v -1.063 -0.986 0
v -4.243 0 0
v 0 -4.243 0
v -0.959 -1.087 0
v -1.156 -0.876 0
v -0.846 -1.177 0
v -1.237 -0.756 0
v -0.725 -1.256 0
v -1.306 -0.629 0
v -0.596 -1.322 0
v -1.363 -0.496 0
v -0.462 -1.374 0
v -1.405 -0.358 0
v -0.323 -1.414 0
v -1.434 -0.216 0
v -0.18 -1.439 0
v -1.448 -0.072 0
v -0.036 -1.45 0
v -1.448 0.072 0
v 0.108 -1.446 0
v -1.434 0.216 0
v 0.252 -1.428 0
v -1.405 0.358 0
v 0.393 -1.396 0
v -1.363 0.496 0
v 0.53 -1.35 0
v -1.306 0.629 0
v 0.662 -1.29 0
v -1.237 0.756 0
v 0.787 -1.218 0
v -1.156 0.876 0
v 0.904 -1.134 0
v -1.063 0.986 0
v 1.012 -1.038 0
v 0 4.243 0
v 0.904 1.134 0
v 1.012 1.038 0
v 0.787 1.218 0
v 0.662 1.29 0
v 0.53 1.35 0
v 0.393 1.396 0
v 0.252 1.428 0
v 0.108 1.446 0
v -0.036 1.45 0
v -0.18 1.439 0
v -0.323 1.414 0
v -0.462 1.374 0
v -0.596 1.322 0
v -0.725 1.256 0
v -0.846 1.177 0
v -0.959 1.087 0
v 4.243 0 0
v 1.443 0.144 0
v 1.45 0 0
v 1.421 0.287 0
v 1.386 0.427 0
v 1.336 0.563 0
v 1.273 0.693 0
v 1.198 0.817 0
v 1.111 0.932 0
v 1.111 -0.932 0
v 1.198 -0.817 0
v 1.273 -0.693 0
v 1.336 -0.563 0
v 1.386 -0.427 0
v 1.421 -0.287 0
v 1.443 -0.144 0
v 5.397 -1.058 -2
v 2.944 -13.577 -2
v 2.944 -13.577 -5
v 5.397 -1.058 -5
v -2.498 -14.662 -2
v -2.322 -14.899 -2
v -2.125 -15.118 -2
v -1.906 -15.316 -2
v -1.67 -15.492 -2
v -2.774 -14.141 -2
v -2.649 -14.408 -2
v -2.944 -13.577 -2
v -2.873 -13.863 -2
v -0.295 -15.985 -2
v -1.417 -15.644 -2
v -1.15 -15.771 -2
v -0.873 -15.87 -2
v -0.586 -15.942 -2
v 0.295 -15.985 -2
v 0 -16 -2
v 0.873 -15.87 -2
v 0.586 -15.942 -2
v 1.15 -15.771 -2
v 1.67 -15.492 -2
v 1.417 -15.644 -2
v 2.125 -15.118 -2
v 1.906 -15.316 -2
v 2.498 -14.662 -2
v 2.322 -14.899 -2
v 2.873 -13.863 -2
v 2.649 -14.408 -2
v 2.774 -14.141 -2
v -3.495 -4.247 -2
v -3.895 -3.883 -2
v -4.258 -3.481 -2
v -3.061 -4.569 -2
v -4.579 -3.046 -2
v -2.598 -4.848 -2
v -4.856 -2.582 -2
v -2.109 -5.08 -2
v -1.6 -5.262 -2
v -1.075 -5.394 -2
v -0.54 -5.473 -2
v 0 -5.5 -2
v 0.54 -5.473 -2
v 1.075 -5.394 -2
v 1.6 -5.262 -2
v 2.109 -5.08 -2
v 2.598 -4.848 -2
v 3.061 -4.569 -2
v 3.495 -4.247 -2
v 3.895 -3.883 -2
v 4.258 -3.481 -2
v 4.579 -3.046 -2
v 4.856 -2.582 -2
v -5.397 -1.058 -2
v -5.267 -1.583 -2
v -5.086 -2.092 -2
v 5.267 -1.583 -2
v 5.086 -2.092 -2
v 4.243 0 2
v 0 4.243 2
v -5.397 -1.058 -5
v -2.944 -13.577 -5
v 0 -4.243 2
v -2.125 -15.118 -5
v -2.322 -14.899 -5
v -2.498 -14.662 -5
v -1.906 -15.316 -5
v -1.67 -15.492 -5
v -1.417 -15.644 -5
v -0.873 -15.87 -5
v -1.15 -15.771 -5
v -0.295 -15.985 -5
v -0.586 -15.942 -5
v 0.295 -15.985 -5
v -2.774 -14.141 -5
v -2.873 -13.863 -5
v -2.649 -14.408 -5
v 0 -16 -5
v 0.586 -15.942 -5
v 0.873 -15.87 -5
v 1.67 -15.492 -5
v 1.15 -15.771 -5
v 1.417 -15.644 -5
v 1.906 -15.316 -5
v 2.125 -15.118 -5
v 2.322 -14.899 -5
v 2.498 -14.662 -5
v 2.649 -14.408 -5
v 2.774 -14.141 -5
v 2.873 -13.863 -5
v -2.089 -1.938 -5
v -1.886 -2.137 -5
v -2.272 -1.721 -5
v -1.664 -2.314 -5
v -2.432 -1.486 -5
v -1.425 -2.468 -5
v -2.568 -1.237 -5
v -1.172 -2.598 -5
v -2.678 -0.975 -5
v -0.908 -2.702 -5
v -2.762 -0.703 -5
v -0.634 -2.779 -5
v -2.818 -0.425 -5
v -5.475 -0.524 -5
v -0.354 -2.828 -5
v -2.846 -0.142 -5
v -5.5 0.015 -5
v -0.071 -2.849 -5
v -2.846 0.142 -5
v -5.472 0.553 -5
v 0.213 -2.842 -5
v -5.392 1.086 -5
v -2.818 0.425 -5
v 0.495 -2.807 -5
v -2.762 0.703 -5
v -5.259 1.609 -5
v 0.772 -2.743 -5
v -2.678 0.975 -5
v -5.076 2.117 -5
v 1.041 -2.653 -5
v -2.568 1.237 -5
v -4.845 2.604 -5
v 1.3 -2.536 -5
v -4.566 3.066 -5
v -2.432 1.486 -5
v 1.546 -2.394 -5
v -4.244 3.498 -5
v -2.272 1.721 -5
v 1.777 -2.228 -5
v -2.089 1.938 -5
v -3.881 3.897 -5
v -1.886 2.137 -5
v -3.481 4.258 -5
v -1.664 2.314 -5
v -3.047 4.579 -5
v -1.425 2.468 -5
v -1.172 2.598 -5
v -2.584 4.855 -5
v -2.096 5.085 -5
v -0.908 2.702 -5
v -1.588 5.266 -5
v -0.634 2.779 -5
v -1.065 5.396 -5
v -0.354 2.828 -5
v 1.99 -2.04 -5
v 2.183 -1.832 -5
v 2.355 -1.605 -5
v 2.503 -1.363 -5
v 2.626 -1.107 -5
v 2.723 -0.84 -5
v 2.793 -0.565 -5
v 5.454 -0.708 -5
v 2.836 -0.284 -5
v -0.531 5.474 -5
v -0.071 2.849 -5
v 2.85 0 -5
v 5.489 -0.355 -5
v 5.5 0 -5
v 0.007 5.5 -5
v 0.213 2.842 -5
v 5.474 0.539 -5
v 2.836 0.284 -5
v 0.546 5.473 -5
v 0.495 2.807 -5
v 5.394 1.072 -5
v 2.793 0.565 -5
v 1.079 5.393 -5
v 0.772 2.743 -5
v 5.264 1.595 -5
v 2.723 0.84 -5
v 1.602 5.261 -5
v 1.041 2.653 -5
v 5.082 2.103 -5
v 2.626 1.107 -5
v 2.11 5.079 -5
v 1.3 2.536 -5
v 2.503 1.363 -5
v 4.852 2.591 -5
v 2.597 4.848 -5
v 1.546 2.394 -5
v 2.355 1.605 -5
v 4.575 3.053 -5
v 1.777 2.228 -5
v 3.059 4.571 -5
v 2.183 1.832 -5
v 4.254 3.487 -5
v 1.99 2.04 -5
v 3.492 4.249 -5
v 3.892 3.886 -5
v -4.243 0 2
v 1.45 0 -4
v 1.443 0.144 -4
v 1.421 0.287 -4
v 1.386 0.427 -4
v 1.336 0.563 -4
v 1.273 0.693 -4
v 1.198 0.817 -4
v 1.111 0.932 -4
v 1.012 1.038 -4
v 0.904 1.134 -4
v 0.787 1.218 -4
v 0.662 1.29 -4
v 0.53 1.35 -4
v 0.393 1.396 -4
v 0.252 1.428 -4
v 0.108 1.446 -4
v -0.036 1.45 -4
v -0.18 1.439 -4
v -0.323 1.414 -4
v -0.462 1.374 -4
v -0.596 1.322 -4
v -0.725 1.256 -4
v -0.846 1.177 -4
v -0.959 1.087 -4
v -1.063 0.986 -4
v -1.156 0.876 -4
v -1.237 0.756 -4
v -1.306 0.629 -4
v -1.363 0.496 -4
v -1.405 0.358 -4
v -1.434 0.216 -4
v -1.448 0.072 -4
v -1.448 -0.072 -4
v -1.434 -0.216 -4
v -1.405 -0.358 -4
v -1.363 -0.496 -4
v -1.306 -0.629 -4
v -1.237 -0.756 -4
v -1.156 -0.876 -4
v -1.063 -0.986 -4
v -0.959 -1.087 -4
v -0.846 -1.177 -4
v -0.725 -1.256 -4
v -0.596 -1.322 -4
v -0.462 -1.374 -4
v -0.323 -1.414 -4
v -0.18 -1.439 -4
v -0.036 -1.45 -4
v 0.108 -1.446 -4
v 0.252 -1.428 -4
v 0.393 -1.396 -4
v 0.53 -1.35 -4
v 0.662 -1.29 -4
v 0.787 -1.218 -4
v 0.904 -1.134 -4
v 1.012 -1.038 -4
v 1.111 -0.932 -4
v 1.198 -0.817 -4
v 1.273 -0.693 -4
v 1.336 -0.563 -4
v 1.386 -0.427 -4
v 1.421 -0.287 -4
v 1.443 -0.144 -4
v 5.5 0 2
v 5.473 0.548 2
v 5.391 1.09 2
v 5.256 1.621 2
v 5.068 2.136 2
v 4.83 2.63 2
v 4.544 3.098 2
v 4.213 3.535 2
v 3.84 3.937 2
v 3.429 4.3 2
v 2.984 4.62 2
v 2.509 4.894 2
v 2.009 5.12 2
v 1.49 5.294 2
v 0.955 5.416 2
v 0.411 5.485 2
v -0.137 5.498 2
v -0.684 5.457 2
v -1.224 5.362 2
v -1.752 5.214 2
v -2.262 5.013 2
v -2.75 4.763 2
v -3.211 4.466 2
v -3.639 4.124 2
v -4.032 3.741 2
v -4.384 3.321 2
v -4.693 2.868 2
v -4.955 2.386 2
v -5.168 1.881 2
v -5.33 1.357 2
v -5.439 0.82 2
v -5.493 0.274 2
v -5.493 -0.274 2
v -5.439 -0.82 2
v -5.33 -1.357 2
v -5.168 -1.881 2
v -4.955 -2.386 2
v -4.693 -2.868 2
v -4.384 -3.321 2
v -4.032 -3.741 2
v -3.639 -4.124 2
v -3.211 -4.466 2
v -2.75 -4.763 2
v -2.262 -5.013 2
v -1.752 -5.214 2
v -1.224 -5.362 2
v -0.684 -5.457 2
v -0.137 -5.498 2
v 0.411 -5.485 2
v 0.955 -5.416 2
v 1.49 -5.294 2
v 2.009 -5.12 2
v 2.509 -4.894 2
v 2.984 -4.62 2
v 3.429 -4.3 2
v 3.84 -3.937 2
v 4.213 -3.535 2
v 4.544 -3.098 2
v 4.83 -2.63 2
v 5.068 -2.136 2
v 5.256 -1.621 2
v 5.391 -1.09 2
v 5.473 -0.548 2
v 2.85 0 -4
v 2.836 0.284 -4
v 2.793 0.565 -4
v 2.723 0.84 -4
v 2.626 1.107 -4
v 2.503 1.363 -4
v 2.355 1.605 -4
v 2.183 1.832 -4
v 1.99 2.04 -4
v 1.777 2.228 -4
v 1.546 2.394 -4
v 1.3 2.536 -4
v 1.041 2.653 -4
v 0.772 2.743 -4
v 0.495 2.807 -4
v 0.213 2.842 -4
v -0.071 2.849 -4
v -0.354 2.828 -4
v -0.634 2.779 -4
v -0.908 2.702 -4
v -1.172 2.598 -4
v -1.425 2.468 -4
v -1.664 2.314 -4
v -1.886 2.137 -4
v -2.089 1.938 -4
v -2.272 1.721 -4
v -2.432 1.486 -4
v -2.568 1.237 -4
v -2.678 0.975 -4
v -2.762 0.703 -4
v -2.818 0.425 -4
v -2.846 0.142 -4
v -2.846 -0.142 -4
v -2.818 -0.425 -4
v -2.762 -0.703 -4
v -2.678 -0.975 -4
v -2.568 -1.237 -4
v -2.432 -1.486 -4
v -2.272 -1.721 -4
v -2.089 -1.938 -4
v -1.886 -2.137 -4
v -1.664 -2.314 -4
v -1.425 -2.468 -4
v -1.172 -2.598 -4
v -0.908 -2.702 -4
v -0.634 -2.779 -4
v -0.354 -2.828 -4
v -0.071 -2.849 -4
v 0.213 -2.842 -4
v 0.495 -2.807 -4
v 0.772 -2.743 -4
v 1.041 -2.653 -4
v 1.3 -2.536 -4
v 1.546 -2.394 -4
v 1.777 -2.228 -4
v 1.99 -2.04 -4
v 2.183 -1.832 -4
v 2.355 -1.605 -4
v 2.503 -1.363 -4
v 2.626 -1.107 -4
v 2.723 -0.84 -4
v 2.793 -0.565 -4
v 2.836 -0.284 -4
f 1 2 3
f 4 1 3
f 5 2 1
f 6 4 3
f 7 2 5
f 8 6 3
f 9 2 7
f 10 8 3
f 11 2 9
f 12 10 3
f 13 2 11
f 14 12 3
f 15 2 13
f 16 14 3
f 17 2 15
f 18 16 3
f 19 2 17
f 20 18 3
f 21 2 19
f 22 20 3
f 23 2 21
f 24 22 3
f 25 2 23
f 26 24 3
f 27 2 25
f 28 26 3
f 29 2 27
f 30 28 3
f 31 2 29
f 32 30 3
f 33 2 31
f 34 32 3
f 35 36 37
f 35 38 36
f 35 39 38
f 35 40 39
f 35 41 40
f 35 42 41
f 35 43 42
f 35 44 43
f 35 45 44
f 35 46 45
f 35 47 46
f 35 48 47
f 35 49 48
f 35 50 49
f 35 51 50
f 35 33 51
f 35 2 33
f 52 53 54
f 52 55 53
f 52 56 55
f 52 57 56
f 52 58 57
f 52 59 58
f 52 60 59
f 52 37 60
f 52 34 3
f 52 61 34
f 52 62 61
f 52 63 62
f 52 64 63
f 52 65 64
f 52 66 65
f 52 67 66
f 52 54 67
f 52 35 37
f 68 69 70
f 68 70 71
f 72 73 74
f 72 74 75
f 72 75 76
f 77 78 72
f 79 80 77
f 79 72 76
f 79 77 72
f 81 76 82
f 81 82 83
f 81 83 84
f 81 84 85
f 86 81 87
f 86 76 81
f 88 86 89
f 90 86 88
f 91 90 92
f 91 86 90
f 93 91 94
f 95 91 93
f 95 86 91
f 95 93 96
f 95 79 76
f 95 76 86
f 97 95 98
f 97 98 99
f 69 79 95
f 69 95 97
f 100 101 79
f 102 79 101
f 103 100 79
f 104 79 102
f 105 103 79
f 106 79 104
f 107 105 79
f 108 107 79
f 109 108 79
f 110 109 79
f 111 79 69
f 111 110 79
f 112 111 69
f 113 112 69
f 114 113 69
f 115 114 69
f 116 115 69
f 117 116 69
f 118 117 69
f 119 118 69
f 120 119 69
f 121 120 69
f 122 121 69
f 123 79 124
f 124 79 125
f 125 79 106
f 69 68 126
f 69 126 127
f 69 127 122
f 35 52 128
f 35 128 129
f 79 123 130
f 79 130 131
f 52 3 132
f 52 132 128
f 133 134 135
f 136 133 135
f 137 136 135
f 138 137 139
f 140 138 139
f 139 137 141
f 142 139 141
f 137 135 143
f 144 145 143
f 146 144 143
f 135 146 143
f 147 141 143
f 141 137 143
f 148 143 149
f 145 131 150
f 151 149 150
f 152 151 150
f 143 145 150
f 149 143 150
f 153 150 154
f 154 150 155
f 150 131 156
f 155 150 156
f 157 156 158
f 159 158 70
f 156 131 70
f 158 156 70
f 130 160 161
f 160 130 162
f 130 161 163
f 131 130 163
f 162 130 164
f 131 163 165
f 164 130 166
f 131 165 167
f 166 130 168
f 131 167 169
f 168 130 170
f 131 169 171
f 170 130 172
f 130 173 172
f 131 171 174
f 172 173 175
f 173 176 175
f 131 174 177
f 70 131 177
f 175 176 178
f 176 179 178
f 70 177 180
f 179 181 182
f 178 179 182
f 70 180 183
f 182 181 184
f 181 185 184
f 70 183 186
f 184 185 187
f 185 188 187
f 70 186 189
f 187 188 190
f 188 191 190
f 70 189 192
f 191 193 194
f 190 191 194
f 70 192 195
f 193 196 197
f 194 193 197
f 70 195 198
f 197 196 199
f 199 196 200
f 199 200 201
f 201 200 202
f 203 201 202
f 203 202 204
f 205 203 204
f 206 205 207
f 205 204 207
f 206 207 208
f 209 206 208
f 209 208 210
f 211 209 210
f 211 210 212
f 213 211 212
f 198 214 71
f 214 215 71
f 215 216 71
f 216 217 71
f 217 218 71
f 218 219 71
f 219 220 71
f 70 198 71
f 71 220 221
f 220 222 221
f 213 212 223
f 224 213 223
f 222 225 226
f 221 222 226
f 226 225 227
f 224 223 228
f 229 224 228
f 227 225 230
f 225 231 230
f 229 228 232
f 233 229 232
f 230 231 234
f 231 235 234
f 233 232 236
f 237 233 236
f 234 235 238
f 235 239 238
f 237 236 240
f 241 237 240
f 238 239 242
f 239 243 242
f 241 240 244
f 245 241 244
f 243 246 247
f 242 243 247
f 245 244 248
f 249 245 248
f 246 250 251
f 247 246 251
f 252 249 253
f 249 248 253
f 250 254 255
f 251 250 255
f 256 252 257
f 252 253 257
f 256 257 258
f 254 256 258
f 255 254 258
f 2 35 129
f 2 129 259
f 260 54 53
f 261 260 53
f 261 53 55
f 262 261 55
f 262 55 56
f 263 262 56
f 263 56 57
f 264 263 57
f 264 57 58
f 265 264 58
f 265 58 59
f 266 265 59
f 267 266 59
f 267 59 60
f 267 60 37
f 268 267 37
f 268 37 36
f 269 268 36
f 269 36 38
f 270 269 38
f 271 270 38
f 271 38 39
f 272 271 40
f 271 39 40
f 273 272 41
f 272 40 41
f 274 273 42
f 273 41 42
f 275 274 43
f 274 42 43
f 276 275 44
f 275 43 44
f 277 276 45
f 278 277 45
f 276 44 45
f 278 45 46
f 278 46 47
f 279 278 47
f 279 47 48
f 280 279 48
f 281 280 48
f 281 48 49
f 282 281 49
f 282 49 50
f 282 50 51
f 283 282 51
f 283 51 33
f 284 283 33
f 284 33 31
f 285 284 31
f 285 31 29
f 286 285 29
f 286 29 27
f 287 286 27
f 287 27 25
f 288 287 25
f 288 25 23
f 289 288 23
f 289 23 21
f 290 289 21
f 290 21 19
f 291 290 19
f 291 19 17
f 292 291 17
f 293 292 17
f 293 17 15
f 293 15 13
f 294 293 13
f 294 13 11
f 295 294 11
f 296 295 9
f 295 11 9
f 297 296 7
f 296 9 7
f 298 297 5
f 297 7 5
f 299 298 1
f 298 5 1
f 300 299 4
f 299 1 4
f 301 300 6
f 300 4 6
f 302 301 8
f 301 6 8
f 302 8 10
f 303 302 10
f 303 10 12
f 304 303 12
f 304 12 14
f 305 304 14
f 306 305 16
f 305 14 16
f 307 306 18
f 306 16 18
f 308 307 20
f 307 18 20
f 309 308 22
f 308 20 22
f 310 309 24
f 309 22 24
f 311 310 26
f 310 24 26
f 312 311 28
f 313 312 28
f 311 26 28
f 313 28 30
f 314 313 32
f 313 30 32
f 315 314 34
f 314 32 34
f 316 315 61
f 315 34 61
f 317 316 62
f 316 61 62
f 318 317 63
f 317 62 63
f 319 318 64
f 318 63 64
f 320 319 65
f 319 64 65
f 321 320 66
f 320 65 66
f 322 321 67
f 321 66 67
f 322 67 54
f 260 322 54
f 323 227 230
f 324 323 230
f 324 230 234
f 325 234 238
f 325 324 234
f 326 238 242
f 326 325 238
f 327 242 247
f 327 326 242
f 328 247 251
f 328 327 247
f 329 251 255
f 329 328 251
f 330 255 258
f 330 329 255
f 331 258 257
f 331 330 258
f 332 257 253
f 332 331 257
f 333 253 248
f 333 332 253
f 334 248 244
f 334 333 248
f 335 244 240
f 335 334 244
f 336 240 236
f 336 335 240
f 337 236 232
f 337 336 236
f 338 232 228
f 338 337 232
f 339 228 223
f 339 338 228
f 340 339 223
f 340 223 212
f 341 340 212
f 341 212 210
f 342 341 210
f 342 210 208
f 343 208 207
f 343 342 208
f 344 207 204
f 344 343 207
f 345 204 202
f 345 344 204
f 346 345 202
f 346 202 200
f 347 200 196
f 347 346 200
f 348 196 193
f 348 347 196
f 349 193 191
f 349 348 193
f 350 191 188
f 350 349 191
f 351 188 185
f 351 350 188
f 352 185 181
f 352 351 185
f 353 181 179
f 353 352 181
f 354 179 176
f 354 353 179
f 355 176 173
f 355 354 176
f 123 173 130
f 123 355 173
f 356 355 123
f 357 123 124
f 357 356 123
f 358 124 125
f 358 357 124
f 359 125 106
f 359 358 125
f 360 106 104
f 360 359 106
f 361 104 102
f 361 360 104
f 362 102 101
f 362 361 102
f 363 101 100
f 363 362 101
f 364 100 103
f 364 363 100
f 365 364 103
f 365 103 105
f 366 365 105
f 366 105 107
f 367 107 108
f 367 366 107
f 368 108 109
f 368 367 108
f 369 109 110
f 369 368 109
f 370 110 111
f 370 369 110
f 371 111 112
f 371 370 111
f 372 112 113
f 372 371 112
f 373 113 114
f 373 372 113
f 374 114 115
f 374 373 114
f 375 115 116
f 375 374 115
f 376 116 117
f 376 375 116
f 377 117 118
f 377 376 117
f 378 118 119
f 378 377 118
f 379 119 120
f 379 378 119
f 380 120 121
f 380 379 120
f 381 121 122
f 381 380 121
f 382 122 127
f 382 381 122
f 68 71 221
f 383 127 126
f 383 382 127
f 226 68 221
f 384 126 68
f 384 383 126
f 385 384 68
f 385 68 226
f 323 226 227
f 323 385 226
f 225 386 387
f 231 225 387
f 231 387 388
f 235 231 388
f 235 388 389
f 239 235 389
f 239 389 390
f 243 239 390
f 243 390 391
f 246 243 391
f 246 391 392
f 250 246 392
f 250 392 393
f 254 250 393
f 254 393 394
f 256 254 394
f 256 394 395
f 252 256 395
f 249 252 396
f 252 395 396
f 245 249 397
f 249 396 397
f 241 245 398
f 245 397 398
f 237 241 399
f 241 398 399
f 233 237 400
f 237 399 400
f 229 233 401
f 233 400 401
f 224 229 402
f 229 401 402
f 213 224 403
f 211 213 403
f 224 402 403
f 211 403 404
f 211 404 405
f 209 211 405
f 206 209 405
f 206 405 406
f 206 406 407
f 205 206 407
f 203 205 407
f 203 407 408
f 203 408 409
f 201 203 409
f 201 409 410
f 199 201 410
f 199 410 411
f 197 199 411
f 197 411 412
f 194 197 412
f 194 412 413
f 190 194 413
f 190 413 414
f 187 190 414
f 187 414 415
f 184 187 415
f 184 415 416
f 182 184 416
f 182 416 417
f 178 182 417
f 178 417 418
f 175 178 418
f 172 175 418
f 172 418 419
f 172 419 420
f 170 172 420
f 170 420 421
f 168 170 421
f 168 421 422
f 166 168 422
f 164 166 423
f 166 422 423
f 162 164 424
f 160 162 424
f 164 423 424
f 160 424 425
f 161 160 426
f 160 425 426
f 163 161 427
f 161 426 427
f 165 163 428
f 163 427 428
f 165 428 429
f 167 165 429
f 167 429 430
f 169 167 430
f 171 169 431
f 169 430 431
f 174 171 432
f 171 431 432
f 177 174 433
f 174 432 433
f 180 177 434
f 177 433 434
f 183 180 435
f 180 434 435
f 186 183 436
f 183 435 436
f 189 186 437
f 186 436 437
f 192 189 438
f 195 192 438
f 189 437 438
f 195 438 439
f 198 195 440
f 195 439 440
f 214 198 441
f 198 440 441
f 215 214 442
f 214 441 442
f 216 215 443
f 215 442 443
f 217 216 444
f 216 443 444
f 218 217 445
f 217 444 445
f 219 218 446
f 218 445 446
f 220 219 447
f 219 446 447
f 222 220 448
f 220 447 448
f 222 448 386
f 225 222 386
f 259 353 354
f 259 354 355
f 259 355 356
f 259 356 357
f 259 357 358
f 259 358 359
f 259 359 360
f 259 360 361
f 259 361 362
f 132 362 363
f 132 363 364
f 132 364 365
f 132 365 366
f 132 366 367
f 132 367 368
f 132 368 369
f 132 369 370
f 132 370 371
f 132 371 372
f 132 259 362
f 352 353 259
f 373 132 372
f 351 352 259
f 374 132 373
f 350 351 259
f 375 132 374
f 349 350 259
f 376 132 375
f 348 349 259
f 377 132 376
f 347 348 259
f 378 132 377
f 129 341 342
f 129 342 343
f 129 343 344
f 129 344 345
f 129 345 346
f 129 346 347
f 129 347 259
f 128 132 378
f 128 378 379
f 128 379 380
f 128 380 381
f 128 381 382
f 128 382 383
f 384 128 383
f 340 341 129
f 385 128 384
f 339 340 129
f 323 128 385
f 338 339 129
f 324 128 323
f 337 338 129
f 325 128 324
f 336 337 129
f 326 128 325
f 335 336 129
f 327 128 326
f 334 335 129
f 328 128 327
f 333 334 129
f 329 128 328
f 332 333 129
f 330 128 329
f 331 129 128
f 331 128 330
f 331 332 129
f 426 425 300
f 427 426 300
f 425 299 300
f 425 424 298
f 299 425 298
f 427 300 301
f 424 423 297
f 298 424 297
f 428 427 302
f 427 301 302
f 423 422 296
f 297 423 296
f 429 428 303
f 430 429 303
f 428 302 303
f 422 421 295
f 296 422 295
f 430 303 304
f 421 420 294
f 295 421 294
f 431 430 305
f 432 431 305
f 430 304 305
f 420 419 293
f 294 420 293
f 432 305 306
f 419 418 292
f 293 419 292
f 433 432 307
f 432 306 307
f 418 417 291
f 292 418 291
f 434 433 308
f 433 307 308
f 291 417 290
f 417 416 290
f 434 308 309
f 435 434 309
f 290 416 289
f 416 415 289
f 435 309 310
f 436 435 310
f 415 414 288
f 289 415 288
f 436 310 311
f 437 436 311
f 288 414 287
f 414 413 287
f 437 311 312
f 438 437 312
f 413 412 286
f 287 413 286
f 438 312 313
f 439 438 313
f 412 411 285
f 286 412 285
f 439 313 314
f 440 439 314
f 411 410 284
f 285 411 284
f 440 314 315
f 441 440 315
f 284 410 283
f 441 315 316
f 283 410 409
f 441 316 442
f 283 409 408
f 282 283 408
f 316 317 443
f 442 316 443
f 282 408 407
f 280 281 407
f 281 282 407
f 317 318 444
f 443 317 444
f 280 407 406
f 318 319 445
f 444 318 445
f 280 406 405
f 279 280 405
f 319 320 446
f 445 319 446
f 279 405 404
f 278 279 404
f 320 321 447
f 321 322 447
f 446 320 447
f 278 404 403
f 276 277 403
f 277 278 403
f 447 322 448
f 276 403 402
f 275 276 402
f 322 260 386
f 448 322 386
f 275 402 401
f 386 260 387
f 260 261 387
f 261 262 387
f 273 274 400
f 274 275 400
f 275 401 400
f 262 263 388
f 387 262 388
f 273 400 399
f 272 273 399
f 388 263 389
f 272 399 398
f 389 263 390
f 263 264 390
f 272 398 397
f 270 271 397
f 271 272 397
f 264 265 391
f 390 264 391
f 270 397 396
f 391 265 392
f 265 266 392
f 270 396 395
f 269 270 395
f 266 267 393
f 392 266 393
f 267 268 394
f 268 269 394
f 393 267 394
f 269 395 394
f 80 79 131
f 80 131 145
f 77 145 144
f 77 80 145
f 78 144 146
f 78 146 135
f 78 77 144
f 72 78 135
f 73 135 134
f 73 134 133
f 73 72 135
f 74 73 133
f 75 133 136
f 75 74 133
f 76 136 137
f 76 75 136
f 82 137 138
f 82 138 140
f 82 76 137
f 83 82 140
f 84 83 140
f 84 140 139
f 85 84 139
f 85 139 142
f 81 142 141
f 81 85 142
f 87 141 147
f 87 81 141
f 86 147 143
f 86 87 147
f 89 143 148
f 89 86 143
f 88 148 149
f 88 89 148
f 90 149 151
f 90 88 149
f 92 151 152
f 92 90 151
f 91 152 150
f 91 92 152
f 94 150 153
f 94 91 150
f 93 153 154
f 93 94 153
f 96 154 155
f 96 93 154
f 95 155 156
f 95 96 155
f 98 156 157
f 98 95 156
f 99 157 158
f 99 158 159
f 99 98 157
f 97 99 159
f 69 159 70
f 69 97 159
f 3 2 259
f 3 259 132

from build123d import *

# Parameters (mm, degrees)
F0_R          = 5.5
F1_DEPTH      = 5
F1_DEPTH_BACK = 2
F3_DEPTH      = 2
F5_START      = -2
F5_DEPTH      = 3
F7_START      = -4
F6_R          = 2.85
F7_DEPTH      = 21
F8_R          = 1.45
F9_DEPTH      = 25
F9_DEPTH_BACK = 25


with BuildPart() as f1:
    # F0 (on Top) → F1 (new body, two sides)
    with BuildSketch(Plane.XY) as f1_sk:
        Circle(F0_R)
    extrude(amount=-F1_DEPTH)
    extrude(f1_sk.sketch, amount=F1_DEPTH_BACK)

    # F2 (on Top) → F3 (cut)
    with BuildSketch(Plane.XY):
        Polygon((4.2426406871, 0), (0, 4.2426406871), (-4.2426406871, 0), (0, -4.2426406871), align=None)
    extrude(amount=F3_DEPTH, mode=Mode.SUBTRACT)

    # F4 (on Top) → F5 (join)
    with BuildSketch(Plane.XY.offset(F5_START)):
        with BuildLine():
            Line((-5.3973407325, -1.0576923077), (-2.9440040359, -13.5769230769))
            ThreePointArc((-2.9440040359, -13.5769230769), (0, -16), (2.9440040359, -13.5769230769))
            Line((2.9440040359, -13.5769230769), (5.3973407325, -1.0576923077))
            ThreePointArc((5.3973407325, -1.0576923077), (0, 5.5), (-5.3973407325, -1.0576923077))
        make_face()
    extrude(amount=-F5_DEPTH)

    # F6 (on Top) → F7 (cut)
    with BuildSketch(Plane.XY.offset(F7_START)):
        Circle(F6_R)
    extrude(amount=-F7_DEPTH, mode=Mode.SUBTRACT)

    # F8 (on Top) → F9 (cut, two sides)
    with BuildSketch(Plane.XY) as f9_sk:
        Circle(F8_R)
    extrude(amount=-F9_DEPTH, mode=Mode.SUBTRACT)
    extrude(f9_sk.sketch, amount=F9_DEPTH_BACK, mode=Mode.SUBTRACT)


solid = f1.part
